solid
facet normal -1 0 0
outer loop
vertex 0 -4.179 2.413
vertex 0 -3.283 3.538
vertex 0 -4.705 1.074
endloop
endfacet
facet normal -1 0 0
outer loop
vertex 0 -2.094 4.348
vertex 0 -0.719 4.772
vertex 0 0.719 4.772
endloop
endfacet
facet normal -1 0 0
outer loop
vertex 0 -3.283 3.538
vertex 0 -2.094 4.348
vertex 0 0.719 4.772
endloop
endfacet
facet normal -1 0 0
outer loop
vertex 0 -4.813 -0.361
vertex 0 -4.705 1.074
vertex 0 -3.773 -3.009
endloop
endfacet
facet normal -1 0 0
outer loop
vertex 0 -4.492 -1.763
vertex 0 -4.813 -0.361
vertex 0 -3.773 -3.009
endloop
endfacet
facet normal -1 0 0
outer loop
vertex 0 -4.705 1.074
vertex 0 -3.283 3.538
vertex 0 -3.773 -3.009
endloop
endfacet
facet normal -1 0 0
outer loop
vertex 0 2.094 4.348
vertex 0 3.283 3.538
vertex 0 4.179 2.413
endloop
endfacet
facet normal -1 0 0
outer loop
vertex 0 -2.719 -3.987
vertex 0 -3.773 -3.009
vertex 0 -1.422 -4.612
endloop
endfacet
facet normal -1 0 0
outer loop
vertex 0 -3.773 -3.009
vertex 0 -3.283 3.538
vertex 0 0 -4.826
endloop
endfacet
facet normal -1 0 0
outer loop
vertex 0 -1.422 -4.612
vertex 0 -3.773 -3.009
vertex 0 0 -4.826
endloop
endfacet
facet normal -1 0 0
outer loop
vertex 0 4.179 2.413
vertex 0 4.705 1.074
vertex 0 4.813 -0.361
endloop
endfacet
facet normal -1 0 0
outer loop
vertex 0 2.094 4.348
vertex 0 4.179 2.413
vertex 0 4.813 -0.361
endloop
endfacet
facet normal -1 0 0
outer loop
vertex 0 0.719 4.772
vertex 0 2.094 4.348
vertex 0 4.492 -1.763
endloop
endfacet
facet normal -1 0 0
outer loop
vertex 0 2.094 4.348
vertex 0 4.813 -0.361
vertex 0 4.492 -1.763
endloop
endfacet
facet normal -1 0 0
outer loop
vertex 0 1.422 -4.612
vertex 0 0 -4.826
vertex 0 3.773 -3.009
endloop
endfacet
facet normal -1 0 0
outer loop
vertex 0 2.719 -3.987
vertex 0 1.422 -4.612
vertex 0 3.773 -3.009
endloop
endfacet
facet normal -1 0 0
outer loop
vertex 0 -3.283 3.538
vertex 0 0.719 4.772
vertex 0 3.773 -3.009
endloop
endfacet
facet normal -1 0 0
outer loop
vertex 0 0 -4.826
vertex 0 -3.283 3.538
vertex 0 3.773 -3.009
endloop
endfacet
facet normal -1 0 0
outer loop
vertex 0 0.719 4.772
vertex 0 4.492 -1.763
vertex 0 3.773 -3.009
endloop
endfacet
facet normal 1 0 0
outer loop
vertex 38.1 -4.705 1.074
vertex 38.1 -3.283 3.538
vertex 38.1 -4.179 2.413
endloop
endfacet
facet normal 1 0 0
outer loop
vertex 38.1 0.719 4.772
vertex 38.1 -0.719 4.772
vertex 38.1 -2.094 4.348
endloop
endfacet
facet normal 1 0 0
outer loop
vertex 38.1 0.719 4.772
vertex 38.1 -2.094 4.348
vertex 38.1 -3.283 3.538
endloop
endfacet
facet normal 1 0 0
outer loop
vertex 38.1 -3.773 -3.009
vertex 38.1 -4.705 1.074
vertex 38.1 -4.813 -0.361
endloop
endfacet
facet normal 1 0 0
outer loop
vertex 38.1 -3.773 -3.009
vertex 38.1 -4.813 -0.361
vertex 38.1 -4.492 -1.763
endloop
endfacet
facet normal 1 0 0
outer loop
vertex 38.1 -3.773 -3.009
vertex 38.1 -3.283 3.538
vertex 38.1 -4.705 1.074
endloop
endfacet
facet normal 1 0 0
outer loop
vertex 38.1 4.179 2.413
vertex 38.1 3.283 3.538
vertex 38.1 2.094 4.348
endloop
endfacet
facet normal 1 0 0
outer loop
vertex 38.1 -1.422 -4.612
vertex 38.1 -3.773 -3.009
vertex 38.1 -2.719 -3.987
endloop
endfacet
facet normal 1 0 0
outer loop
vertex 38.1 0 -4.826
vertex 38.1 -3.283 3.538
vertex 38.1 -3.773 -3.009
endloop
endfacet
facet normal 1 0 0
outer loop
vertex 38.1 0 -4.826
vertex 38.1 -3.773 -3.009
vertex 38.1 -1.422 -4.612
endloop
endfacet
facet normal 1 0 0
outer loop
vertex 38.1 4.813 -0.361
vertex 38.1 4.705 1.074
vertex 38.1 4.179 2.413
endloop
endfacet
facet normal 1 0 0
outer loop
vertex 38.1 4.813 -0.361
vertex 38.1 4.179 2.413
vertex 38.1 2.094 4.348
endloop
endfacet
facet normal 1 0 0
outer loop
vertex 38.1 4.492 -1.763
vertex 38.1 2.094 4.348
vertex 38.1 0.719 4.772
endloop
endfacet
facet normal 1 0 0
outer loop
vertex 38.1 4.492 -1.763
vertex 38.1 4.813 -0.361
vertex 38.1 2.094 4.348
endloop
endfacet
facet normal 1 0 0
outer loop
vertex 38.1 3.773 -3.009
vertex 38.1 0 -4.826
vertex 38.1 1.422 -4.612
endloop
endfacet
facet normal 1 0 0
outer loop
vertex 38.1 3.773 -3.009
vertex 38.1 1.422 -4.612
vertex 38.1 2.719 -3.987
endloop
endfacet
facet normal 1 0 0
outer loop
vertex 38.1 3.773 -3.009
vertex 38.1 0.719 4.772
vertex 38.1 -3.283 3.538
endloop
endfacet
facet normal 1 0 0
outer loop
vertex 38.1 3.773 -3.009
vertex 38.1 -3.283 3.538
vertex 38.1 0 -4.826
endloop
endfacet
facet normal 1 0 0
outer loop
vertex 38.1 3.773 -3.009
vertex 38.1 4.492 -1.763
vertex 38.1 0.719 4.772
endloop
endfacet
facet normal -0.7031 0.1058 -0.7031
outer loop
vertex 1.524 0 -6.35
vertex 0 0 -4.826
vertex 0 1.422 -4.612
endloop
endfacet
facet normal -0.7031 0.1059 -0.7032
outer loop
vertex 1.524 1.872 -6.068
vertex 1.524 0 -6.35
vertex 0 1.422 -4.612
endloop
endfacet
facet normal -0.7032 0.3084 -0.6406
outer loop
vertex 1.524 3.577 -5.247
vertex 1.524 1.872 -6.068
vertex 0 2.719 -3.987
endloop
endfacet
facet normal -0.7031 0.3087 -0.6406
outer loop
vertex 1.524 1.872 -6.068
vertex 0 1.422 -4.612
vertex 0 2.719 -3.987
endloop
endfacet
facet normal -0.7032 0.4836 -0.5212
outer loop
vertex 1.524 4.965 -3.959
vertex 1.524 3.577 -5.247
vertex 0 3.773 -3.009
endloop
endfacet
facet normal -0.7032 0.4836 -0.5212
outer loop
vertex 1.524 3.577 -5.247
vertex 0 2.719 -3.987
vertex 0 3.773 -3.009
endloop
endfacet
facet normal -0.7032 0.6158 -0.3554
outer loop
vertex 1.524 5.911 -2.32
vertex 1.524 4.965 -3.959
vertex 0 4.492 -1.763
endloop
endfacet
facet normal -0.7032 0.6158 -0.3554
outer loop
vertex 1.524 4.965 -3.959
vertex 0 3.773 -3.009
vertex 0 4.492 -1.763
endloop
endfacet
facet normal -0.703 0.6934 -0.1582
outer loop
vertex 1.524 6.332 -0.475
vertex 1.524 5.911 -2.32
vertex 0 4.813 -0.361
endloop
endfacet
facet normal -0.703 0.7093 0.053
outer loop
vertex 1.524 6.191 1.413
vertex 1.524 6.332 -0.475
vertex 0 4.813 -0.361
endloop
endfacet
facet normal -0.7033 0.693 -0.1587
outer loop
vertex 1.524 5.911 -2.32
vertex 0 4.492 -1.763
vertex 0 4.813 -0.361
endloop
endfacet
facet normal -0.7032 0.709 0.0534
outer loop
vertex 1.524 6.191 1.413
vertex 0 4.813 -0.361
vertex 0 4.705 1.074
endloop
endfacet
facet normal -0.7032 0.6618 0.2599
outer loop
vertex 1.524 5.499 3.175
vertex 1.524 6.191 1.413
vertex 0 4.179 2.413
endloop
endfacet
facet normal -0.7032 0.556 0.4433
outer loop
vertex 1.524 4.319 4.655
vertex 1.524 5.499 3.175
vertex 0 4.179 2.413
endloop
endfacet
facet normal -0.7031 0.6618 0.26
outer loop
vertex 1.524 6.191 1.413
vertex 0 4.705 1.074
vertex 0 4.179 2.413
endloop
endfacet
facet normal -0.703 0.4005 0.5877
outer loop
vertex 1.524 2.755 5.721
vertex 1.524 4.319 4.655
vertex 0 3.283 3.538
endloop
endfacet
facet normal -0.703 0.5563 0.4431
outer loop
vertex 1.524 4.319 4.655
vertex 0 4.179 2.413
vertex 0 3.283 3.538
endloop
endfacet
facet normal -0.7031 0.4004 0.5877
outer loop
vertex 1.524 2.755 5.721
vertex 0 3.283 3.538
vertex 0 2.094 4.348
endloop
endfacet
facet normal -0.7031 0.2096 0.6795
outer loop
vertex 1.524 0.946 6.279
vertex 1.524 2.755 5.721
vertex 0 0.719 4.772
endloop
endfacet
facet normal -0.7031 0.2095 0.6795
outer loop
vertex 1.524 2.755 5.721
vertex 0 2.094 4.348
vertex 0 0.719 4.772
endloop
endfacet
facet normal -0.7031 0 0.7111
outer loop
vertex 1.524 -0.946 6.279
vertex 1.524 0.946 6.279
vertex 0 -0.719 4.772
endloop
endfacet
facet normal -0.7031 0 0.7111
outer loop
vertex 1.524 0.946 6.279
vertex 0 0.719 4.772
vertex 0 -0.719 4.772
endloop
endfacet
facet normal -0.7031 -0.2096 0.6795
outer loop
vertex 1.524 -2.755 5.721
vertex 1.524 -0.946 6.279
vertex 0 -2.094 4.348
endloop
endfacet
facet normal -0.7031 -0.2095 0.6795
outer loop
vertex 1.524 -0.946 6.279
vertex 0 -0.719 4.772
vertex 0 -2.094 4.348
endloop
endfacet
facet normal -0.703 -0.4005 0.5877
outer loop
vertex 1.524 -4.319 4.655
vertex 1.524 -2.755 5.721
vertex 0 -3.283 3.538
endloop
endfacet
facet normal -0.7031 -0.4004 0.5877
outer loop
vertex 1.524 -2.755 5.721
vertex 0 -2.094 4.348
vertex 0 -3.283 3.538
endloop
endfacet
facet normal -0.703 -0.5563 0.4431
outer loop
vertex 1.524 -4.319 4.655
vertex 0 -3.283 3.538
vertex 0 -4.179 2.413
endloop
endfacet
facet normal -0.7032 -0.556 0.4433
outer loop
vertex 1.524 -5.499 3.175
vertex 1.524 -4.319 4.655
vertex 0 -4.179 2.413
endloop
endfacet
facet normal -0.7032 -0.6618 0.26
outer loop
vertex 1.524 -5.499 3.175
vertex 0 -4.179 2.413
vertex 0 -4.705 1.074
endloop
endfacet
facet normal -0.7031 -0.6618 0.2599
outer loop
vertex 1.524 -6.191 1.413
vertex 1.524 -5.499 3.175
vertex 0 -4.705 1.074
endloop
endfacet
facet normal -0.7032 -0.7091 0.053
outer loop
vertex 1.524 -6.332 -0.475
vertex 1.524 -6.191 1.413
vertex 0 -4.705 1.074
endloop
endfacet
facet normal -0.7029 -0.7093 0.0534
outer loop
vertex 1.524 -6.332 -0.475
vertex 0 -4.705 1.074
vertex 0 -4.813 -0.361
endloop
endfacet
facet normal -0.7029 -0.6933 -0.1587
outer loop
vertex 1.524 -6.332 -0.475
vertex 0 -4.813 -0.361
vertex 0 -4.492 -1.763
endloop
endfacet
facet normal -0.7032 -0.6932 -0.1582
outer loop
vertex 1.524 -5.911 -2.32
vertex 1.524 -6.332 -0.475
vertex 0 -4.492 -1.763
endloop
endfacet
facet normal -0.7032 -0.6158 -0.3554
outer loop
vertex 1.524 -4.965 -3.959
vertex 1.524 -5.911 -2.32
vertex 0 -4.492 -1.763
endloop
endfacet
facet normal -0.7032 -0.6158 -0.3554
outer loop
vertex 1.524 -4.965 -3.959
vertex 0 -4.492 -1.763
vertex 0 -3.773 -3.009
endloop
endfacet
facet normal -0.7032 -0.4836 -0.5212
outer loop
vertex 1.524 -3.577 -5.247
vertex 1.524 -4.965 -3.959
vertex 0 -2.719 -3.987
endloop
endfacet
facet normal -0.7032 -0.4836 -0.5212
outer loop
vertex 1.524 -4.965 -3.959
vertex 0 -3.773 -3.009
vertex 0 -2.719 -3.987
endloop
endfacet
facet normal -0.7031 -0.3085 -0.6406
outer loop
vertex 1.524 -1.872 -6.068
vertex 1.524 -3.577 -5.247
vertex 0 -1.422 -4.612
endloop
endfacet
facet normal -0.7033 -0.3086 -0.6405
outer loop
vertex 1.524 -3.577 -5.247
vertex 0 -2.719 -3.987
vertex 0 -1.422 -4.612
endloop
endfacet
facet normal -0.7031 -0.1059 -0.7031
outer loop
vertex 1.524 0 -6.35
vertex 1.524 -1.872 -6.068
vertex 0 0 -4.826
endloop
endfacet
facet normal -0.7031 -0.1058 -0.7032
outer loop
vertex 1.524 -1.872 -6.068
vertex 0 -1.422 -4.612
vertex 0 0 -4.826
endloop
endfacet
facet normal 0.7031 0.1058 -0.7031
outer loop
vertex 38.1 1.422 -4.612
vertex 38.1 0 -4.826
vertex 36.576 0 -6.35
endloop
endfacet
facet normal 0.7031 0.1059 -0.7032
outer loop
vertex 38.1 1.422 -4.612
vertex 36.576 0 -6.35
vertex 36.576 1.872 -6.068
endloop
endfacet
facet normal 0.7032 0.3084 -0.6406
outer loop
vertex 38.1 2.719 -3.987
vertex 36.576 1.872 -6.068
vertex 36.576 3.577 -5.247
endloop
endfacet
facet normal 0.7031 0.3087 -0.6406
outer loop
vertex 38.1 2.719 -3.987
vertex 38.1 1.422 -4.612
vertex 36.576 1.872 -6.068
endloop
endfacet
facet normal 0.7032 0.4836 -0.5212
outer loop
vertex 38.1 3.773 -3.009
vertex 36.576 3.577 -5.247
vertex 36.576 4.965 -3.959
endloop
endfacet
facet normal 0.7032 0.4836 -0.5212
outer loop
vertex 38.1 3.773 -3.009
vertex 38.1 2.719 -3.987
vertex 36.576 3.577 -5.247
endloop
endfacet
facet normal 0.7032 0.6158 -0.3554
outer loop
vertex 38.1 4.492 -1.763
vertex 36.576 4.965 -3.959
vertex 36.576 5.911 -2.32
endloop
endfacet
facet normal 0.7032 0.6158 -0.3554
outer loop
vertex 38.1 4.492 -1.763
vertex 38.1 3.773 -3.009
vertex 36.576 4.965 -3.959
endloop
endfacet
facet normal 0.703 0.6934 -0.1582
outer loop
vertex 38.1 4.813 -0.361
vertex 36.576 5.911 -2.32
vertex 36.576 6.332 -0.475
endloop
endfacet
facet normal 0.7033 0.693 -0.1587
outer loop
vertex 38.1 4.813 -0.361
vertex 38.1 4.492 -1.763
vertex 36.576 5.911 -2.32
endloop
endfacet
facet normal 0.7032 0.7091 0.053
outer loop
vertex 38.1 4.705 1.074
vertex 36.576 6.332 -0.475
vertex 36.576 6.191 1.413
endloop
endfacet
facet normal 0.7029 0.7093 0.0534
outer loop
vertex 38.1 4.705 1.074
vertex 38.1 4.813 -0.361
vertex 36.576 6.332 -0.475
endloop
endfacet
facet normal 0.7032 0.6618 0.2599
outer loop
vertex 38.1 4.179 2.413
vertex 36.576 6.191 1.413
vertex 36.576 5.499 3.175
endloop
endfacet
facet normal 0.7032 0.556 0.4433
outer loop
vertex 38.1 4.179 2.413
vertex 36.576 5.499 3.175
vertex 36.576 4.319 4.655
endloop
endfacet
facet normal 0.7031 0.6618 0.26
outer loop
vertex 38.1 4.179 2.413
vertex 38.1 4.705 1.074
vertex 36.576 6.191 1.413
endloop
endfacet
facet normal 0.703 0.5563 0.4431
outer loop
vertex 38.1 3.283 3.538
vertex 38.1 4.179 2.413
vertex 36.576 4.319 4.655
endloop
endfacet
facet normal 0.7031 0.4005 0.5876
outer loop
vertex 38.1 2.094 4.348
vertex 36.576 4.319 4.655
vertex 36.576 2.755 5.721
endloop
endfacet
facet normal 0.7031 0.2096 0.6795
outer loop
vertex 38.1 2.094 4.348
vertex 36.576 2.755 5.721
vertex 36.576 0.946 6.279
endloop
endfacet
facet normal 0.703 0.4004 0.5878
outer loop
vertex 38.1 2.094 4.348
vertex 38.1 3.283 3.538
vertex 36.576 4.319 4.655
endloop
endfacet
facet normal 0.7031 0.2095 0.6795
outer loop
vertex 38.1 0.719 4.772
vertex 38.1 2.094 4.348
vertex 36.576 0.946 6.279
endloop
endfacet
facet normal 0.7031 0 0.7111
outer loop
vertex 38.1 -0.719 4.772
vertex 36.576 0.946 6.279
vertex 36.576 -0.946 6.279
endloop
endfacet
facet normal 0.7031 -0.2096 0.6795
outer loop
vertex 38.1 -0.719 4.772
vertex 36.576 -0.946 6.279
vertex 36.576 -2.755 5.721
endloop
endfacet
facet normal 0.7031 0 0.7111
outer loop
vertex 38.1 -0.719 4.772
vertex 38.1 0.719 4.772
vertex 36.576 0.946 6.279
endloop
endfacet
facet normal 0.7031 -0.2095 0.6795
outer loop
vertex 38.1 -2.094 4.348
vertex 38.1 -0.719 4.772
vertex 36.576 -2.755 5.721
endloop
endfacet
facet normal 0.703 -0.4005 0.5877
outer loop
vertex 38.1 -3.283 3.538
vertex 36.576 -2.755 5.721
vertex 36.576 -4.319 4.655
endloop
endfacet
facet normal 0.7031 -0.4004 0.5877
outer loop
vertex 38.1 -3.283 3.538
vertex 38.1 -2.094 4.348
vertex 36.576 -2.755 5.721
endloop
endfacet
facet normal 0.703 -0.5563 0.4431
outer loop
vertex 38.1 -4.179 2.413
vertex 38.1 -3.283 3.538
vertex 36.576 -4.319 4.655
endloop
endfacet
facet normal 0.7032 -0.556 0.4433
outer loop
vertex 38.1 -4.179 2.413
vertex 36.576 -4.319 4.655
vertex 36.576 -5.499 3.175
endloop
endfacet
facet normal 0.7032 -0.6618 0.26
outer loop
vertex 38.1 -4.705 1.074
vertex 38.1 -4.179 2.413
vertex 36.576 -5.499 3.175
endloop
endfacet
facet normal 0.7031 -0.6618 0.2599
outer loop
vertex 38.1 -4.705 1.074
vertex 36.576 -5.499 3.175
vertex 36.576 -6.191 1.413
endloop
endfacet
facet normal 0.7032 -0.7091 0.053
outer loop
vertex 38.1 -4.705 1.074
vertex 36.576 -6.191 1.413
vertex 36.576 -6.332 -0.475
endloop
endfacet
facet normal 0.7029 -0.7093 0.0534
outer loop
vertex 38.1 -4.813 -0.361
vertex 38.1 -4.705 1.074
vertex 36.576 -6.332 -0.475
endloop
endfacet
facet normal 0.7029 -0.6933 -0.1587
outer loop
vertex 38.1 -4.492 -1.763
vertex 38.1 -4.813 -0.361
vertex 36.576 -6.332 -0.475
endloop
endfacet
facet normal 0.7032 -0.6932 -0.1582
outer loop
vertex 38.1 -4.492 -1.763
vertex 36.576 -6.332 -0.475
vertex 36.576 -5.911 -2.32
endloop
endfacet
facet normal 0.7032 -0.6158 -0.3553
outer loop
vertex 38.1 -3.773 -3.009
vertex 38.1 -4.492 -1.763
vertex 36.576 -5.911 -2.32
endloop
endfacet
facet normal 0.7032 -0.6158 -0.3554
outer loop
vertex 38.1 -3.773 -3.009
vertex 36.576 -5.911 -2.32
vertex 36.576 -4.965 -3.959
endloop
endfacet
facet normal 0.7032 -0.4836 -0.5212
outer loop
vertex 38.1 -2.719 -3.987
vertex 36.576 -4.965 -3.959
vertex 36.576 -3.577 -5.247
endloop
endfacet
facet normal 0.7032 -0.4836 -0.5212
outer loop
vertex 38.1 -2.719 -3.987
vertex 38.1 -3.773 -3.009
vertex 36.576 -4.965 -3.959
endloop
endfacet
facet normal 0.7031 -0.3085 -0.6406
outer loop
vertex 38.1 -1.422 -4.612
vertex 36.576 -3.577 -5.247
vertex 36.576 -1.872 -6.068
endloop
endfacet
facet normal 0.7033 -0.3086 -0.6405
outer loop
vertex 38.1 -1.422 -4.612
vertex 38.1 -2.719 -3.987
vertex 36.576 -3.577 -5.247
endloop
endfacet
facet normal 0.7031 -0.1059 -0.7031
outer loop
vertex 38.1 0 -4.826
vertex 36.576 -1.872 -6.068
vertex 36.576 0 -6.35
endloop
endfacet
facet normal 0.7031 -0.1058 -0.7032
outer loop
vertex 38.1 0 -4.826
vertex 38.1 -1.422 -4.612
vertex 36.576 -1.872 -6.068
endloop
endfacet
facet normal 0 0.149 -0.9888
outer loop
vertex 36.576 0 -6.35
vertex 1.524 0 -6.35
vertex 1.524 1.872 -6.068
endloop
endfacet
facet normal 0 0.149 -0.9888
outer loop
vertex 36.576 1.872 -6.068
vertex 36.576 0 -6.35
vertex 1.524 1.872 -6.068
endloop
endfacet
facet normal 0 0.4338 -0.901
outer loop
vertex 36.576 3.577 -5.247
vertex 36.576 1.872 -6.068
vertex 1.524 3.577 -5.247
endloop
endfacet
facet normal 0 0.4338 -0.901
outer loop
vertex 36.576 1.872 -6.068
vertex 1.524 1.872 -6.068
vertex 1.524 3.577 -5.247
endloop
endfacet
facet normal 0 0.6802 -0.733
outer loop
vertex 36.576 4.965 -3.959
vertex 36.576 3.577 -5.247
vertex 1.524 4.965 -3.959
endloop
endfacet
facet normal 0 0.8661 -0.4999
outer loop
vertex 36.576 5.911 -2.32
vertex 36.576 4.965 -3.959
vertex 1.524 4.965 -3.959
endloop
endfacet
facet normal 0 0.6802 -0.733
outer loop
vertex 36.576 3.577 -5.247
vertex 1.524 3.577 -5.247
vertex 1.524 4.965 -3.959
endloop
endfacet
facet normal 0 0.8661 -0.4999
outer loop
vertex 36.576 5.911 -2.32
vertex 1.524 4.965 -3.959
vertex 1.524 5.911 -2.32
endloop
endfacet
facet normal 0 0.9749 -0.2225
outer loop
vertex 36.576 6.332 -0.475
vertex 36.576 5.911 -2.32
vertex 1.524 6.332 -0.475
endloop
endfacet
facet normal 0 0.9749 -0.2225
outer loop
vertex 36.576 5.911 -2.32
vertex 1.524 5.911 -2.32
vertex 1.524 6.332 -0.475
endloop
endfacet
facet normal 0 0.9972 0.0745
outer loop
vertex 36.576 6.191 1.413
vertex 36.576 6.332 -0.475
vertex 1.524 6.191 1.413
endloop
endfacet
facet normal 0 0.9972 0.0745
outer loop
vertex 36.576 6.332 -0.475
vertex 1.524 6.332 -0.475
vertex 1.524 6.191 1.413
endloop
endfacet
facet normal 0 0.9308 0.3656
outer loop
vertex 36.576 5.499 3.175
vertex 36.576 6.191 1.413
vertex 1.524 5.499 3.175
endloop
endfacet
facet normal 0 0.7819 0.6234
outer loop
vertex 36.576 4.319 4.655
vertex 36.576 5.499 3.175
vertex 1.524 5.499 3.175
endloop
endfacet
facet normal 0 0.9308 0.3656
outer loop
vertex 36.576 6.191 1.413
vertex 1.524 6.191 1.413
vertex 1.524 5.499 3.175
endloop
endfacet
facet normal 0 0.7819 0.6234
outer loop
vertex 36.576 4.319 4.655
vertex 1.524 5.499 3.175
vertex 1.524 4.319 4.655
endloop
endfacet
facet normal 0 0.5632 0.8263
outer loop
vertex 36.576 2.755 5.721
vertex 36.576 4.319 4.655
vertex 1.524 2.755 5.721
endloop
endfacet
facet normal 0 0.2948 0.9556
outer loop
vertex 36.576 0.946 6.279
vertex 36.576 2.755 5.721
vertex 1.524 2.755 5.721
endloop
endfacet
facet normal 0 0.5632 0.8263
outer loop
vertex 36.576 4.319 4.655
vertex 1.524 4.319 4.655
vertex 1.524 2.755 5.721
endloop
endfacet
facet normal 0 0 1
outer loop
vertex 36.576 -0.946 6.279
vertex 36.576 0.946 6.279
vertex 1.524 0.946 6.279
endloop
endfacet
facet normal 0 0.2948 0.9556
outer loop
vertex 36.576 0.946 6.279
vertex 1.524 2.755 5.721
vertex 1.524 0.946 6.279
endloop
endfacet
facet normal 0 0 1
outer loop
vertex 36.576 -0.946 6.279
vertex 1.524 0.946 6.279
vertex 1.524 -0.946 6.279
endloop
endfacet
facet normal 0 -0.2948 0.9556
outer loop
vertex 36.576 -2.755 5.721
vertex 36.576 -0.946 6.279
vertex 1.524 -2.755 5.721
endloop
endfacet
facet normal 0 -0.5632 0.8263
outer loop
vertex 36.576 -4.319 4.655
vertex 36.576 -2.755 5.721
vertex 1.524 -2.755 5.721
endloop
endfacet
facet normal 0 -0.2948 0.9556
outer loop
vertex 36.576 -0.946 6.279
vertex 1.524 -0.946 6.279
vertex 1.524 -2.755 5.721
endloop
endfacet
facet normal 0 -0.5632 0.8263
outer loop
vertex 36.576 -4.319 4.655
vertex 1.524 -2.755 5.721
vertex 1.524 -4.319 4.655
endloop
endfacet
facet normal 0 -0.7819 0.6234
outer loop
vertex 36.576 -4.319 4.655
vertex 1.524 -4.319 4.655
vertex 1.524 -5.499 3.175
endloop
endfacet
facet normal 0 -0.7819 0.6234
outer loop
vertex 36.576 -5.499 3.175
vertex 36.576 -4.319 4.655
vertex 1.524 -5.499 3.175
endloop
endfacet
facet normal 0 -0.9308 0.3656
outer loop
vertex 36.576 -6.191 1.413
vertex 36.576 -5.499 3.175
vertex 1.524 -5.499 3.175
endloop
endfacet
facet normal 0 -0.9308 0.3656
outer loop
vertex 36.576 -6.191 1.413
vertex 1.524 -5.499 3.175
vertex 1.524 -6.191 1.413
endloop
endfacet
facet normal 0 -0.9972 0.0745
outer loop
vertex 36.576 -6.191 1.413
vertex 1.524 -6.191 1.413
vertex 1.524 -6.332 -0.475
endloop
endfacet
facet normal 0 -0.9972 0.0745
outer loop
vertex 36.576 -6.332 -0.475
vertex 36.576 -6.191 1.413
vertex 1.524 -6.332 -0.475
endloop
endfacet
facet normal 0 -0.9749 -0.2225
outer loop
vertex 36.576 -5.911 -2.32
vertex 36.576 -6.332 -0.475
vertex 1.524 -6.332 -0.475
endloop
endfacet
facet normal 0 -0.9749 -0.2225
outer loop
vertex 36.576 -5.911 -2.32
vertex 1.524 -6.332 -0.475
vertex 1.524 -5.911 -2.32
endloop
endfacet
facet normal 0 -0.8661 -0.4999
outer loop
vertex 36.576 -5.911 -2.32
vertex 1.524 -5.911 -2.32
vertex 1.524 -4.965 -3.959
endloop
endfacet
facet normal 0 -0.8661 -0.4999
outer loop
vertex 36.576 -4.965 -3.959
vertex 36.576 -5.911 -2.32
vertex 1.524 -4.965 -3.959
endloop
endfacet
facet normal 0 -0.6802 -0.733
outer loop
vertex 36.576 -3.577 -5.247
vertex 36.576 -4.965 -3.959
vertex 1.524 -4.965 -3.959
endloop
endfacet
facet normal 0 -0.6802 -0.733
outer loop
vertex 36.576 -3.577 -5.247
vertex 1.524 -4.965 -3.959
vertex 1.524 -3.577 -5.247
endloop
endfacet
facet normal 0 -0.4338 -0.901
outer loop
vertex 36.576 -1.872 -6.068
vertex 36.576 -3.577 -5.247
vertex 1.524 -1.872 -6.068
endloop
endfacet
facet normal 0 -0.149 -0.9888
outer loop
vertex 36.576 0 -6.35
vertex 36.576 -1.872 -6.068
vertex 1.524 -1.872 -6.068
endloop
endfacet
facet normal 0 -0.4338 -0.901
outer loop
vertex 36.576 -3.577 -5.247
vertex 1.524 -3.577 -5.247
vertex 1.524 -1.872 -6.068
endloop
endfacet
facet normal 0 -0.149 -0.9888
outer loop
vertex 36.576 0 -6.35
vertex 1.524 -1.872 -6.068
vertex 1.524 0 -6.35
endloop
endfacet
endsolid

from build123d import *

# Parameters (mm, degrees)
SKETCH2_R           = 6.35
BOSS_EXTRUDE1_DEPTH = 38.1
CHAMFER1_SIZE       = 1.524
CHAMFER2_SIZE       = 1.524


with BuildPart() as part:
    # Sketch2 → Boss-Extrude1 (new body)
    with BuildSketch(Plane(origin=(0, 0, 0), x_dir=(0, 0, -1), z_dir=(1, 0, 0))):
        Circle(SKETCH2_R)
    extrude(amount=BOSS_EXTRUDE1_DEPTH)

    # Chamfer1
    chamfer1_edges = [part.edges().sort_by_distance(p)[0] for p in [
        (38.1, 0, 6.35),
    ]]
    chamfer(chamfer1_edges, length=CHAMFER1_SIZE)

    # Chamfer2
    chamfer2_edges = [part.edges().sort_by_distance(p)[0] for p in [
        (0, 0, 6.35),
    ]]
    chamfer(chamfer2_edges, length=CHAMFER2_SIZE)


solid = part.part
